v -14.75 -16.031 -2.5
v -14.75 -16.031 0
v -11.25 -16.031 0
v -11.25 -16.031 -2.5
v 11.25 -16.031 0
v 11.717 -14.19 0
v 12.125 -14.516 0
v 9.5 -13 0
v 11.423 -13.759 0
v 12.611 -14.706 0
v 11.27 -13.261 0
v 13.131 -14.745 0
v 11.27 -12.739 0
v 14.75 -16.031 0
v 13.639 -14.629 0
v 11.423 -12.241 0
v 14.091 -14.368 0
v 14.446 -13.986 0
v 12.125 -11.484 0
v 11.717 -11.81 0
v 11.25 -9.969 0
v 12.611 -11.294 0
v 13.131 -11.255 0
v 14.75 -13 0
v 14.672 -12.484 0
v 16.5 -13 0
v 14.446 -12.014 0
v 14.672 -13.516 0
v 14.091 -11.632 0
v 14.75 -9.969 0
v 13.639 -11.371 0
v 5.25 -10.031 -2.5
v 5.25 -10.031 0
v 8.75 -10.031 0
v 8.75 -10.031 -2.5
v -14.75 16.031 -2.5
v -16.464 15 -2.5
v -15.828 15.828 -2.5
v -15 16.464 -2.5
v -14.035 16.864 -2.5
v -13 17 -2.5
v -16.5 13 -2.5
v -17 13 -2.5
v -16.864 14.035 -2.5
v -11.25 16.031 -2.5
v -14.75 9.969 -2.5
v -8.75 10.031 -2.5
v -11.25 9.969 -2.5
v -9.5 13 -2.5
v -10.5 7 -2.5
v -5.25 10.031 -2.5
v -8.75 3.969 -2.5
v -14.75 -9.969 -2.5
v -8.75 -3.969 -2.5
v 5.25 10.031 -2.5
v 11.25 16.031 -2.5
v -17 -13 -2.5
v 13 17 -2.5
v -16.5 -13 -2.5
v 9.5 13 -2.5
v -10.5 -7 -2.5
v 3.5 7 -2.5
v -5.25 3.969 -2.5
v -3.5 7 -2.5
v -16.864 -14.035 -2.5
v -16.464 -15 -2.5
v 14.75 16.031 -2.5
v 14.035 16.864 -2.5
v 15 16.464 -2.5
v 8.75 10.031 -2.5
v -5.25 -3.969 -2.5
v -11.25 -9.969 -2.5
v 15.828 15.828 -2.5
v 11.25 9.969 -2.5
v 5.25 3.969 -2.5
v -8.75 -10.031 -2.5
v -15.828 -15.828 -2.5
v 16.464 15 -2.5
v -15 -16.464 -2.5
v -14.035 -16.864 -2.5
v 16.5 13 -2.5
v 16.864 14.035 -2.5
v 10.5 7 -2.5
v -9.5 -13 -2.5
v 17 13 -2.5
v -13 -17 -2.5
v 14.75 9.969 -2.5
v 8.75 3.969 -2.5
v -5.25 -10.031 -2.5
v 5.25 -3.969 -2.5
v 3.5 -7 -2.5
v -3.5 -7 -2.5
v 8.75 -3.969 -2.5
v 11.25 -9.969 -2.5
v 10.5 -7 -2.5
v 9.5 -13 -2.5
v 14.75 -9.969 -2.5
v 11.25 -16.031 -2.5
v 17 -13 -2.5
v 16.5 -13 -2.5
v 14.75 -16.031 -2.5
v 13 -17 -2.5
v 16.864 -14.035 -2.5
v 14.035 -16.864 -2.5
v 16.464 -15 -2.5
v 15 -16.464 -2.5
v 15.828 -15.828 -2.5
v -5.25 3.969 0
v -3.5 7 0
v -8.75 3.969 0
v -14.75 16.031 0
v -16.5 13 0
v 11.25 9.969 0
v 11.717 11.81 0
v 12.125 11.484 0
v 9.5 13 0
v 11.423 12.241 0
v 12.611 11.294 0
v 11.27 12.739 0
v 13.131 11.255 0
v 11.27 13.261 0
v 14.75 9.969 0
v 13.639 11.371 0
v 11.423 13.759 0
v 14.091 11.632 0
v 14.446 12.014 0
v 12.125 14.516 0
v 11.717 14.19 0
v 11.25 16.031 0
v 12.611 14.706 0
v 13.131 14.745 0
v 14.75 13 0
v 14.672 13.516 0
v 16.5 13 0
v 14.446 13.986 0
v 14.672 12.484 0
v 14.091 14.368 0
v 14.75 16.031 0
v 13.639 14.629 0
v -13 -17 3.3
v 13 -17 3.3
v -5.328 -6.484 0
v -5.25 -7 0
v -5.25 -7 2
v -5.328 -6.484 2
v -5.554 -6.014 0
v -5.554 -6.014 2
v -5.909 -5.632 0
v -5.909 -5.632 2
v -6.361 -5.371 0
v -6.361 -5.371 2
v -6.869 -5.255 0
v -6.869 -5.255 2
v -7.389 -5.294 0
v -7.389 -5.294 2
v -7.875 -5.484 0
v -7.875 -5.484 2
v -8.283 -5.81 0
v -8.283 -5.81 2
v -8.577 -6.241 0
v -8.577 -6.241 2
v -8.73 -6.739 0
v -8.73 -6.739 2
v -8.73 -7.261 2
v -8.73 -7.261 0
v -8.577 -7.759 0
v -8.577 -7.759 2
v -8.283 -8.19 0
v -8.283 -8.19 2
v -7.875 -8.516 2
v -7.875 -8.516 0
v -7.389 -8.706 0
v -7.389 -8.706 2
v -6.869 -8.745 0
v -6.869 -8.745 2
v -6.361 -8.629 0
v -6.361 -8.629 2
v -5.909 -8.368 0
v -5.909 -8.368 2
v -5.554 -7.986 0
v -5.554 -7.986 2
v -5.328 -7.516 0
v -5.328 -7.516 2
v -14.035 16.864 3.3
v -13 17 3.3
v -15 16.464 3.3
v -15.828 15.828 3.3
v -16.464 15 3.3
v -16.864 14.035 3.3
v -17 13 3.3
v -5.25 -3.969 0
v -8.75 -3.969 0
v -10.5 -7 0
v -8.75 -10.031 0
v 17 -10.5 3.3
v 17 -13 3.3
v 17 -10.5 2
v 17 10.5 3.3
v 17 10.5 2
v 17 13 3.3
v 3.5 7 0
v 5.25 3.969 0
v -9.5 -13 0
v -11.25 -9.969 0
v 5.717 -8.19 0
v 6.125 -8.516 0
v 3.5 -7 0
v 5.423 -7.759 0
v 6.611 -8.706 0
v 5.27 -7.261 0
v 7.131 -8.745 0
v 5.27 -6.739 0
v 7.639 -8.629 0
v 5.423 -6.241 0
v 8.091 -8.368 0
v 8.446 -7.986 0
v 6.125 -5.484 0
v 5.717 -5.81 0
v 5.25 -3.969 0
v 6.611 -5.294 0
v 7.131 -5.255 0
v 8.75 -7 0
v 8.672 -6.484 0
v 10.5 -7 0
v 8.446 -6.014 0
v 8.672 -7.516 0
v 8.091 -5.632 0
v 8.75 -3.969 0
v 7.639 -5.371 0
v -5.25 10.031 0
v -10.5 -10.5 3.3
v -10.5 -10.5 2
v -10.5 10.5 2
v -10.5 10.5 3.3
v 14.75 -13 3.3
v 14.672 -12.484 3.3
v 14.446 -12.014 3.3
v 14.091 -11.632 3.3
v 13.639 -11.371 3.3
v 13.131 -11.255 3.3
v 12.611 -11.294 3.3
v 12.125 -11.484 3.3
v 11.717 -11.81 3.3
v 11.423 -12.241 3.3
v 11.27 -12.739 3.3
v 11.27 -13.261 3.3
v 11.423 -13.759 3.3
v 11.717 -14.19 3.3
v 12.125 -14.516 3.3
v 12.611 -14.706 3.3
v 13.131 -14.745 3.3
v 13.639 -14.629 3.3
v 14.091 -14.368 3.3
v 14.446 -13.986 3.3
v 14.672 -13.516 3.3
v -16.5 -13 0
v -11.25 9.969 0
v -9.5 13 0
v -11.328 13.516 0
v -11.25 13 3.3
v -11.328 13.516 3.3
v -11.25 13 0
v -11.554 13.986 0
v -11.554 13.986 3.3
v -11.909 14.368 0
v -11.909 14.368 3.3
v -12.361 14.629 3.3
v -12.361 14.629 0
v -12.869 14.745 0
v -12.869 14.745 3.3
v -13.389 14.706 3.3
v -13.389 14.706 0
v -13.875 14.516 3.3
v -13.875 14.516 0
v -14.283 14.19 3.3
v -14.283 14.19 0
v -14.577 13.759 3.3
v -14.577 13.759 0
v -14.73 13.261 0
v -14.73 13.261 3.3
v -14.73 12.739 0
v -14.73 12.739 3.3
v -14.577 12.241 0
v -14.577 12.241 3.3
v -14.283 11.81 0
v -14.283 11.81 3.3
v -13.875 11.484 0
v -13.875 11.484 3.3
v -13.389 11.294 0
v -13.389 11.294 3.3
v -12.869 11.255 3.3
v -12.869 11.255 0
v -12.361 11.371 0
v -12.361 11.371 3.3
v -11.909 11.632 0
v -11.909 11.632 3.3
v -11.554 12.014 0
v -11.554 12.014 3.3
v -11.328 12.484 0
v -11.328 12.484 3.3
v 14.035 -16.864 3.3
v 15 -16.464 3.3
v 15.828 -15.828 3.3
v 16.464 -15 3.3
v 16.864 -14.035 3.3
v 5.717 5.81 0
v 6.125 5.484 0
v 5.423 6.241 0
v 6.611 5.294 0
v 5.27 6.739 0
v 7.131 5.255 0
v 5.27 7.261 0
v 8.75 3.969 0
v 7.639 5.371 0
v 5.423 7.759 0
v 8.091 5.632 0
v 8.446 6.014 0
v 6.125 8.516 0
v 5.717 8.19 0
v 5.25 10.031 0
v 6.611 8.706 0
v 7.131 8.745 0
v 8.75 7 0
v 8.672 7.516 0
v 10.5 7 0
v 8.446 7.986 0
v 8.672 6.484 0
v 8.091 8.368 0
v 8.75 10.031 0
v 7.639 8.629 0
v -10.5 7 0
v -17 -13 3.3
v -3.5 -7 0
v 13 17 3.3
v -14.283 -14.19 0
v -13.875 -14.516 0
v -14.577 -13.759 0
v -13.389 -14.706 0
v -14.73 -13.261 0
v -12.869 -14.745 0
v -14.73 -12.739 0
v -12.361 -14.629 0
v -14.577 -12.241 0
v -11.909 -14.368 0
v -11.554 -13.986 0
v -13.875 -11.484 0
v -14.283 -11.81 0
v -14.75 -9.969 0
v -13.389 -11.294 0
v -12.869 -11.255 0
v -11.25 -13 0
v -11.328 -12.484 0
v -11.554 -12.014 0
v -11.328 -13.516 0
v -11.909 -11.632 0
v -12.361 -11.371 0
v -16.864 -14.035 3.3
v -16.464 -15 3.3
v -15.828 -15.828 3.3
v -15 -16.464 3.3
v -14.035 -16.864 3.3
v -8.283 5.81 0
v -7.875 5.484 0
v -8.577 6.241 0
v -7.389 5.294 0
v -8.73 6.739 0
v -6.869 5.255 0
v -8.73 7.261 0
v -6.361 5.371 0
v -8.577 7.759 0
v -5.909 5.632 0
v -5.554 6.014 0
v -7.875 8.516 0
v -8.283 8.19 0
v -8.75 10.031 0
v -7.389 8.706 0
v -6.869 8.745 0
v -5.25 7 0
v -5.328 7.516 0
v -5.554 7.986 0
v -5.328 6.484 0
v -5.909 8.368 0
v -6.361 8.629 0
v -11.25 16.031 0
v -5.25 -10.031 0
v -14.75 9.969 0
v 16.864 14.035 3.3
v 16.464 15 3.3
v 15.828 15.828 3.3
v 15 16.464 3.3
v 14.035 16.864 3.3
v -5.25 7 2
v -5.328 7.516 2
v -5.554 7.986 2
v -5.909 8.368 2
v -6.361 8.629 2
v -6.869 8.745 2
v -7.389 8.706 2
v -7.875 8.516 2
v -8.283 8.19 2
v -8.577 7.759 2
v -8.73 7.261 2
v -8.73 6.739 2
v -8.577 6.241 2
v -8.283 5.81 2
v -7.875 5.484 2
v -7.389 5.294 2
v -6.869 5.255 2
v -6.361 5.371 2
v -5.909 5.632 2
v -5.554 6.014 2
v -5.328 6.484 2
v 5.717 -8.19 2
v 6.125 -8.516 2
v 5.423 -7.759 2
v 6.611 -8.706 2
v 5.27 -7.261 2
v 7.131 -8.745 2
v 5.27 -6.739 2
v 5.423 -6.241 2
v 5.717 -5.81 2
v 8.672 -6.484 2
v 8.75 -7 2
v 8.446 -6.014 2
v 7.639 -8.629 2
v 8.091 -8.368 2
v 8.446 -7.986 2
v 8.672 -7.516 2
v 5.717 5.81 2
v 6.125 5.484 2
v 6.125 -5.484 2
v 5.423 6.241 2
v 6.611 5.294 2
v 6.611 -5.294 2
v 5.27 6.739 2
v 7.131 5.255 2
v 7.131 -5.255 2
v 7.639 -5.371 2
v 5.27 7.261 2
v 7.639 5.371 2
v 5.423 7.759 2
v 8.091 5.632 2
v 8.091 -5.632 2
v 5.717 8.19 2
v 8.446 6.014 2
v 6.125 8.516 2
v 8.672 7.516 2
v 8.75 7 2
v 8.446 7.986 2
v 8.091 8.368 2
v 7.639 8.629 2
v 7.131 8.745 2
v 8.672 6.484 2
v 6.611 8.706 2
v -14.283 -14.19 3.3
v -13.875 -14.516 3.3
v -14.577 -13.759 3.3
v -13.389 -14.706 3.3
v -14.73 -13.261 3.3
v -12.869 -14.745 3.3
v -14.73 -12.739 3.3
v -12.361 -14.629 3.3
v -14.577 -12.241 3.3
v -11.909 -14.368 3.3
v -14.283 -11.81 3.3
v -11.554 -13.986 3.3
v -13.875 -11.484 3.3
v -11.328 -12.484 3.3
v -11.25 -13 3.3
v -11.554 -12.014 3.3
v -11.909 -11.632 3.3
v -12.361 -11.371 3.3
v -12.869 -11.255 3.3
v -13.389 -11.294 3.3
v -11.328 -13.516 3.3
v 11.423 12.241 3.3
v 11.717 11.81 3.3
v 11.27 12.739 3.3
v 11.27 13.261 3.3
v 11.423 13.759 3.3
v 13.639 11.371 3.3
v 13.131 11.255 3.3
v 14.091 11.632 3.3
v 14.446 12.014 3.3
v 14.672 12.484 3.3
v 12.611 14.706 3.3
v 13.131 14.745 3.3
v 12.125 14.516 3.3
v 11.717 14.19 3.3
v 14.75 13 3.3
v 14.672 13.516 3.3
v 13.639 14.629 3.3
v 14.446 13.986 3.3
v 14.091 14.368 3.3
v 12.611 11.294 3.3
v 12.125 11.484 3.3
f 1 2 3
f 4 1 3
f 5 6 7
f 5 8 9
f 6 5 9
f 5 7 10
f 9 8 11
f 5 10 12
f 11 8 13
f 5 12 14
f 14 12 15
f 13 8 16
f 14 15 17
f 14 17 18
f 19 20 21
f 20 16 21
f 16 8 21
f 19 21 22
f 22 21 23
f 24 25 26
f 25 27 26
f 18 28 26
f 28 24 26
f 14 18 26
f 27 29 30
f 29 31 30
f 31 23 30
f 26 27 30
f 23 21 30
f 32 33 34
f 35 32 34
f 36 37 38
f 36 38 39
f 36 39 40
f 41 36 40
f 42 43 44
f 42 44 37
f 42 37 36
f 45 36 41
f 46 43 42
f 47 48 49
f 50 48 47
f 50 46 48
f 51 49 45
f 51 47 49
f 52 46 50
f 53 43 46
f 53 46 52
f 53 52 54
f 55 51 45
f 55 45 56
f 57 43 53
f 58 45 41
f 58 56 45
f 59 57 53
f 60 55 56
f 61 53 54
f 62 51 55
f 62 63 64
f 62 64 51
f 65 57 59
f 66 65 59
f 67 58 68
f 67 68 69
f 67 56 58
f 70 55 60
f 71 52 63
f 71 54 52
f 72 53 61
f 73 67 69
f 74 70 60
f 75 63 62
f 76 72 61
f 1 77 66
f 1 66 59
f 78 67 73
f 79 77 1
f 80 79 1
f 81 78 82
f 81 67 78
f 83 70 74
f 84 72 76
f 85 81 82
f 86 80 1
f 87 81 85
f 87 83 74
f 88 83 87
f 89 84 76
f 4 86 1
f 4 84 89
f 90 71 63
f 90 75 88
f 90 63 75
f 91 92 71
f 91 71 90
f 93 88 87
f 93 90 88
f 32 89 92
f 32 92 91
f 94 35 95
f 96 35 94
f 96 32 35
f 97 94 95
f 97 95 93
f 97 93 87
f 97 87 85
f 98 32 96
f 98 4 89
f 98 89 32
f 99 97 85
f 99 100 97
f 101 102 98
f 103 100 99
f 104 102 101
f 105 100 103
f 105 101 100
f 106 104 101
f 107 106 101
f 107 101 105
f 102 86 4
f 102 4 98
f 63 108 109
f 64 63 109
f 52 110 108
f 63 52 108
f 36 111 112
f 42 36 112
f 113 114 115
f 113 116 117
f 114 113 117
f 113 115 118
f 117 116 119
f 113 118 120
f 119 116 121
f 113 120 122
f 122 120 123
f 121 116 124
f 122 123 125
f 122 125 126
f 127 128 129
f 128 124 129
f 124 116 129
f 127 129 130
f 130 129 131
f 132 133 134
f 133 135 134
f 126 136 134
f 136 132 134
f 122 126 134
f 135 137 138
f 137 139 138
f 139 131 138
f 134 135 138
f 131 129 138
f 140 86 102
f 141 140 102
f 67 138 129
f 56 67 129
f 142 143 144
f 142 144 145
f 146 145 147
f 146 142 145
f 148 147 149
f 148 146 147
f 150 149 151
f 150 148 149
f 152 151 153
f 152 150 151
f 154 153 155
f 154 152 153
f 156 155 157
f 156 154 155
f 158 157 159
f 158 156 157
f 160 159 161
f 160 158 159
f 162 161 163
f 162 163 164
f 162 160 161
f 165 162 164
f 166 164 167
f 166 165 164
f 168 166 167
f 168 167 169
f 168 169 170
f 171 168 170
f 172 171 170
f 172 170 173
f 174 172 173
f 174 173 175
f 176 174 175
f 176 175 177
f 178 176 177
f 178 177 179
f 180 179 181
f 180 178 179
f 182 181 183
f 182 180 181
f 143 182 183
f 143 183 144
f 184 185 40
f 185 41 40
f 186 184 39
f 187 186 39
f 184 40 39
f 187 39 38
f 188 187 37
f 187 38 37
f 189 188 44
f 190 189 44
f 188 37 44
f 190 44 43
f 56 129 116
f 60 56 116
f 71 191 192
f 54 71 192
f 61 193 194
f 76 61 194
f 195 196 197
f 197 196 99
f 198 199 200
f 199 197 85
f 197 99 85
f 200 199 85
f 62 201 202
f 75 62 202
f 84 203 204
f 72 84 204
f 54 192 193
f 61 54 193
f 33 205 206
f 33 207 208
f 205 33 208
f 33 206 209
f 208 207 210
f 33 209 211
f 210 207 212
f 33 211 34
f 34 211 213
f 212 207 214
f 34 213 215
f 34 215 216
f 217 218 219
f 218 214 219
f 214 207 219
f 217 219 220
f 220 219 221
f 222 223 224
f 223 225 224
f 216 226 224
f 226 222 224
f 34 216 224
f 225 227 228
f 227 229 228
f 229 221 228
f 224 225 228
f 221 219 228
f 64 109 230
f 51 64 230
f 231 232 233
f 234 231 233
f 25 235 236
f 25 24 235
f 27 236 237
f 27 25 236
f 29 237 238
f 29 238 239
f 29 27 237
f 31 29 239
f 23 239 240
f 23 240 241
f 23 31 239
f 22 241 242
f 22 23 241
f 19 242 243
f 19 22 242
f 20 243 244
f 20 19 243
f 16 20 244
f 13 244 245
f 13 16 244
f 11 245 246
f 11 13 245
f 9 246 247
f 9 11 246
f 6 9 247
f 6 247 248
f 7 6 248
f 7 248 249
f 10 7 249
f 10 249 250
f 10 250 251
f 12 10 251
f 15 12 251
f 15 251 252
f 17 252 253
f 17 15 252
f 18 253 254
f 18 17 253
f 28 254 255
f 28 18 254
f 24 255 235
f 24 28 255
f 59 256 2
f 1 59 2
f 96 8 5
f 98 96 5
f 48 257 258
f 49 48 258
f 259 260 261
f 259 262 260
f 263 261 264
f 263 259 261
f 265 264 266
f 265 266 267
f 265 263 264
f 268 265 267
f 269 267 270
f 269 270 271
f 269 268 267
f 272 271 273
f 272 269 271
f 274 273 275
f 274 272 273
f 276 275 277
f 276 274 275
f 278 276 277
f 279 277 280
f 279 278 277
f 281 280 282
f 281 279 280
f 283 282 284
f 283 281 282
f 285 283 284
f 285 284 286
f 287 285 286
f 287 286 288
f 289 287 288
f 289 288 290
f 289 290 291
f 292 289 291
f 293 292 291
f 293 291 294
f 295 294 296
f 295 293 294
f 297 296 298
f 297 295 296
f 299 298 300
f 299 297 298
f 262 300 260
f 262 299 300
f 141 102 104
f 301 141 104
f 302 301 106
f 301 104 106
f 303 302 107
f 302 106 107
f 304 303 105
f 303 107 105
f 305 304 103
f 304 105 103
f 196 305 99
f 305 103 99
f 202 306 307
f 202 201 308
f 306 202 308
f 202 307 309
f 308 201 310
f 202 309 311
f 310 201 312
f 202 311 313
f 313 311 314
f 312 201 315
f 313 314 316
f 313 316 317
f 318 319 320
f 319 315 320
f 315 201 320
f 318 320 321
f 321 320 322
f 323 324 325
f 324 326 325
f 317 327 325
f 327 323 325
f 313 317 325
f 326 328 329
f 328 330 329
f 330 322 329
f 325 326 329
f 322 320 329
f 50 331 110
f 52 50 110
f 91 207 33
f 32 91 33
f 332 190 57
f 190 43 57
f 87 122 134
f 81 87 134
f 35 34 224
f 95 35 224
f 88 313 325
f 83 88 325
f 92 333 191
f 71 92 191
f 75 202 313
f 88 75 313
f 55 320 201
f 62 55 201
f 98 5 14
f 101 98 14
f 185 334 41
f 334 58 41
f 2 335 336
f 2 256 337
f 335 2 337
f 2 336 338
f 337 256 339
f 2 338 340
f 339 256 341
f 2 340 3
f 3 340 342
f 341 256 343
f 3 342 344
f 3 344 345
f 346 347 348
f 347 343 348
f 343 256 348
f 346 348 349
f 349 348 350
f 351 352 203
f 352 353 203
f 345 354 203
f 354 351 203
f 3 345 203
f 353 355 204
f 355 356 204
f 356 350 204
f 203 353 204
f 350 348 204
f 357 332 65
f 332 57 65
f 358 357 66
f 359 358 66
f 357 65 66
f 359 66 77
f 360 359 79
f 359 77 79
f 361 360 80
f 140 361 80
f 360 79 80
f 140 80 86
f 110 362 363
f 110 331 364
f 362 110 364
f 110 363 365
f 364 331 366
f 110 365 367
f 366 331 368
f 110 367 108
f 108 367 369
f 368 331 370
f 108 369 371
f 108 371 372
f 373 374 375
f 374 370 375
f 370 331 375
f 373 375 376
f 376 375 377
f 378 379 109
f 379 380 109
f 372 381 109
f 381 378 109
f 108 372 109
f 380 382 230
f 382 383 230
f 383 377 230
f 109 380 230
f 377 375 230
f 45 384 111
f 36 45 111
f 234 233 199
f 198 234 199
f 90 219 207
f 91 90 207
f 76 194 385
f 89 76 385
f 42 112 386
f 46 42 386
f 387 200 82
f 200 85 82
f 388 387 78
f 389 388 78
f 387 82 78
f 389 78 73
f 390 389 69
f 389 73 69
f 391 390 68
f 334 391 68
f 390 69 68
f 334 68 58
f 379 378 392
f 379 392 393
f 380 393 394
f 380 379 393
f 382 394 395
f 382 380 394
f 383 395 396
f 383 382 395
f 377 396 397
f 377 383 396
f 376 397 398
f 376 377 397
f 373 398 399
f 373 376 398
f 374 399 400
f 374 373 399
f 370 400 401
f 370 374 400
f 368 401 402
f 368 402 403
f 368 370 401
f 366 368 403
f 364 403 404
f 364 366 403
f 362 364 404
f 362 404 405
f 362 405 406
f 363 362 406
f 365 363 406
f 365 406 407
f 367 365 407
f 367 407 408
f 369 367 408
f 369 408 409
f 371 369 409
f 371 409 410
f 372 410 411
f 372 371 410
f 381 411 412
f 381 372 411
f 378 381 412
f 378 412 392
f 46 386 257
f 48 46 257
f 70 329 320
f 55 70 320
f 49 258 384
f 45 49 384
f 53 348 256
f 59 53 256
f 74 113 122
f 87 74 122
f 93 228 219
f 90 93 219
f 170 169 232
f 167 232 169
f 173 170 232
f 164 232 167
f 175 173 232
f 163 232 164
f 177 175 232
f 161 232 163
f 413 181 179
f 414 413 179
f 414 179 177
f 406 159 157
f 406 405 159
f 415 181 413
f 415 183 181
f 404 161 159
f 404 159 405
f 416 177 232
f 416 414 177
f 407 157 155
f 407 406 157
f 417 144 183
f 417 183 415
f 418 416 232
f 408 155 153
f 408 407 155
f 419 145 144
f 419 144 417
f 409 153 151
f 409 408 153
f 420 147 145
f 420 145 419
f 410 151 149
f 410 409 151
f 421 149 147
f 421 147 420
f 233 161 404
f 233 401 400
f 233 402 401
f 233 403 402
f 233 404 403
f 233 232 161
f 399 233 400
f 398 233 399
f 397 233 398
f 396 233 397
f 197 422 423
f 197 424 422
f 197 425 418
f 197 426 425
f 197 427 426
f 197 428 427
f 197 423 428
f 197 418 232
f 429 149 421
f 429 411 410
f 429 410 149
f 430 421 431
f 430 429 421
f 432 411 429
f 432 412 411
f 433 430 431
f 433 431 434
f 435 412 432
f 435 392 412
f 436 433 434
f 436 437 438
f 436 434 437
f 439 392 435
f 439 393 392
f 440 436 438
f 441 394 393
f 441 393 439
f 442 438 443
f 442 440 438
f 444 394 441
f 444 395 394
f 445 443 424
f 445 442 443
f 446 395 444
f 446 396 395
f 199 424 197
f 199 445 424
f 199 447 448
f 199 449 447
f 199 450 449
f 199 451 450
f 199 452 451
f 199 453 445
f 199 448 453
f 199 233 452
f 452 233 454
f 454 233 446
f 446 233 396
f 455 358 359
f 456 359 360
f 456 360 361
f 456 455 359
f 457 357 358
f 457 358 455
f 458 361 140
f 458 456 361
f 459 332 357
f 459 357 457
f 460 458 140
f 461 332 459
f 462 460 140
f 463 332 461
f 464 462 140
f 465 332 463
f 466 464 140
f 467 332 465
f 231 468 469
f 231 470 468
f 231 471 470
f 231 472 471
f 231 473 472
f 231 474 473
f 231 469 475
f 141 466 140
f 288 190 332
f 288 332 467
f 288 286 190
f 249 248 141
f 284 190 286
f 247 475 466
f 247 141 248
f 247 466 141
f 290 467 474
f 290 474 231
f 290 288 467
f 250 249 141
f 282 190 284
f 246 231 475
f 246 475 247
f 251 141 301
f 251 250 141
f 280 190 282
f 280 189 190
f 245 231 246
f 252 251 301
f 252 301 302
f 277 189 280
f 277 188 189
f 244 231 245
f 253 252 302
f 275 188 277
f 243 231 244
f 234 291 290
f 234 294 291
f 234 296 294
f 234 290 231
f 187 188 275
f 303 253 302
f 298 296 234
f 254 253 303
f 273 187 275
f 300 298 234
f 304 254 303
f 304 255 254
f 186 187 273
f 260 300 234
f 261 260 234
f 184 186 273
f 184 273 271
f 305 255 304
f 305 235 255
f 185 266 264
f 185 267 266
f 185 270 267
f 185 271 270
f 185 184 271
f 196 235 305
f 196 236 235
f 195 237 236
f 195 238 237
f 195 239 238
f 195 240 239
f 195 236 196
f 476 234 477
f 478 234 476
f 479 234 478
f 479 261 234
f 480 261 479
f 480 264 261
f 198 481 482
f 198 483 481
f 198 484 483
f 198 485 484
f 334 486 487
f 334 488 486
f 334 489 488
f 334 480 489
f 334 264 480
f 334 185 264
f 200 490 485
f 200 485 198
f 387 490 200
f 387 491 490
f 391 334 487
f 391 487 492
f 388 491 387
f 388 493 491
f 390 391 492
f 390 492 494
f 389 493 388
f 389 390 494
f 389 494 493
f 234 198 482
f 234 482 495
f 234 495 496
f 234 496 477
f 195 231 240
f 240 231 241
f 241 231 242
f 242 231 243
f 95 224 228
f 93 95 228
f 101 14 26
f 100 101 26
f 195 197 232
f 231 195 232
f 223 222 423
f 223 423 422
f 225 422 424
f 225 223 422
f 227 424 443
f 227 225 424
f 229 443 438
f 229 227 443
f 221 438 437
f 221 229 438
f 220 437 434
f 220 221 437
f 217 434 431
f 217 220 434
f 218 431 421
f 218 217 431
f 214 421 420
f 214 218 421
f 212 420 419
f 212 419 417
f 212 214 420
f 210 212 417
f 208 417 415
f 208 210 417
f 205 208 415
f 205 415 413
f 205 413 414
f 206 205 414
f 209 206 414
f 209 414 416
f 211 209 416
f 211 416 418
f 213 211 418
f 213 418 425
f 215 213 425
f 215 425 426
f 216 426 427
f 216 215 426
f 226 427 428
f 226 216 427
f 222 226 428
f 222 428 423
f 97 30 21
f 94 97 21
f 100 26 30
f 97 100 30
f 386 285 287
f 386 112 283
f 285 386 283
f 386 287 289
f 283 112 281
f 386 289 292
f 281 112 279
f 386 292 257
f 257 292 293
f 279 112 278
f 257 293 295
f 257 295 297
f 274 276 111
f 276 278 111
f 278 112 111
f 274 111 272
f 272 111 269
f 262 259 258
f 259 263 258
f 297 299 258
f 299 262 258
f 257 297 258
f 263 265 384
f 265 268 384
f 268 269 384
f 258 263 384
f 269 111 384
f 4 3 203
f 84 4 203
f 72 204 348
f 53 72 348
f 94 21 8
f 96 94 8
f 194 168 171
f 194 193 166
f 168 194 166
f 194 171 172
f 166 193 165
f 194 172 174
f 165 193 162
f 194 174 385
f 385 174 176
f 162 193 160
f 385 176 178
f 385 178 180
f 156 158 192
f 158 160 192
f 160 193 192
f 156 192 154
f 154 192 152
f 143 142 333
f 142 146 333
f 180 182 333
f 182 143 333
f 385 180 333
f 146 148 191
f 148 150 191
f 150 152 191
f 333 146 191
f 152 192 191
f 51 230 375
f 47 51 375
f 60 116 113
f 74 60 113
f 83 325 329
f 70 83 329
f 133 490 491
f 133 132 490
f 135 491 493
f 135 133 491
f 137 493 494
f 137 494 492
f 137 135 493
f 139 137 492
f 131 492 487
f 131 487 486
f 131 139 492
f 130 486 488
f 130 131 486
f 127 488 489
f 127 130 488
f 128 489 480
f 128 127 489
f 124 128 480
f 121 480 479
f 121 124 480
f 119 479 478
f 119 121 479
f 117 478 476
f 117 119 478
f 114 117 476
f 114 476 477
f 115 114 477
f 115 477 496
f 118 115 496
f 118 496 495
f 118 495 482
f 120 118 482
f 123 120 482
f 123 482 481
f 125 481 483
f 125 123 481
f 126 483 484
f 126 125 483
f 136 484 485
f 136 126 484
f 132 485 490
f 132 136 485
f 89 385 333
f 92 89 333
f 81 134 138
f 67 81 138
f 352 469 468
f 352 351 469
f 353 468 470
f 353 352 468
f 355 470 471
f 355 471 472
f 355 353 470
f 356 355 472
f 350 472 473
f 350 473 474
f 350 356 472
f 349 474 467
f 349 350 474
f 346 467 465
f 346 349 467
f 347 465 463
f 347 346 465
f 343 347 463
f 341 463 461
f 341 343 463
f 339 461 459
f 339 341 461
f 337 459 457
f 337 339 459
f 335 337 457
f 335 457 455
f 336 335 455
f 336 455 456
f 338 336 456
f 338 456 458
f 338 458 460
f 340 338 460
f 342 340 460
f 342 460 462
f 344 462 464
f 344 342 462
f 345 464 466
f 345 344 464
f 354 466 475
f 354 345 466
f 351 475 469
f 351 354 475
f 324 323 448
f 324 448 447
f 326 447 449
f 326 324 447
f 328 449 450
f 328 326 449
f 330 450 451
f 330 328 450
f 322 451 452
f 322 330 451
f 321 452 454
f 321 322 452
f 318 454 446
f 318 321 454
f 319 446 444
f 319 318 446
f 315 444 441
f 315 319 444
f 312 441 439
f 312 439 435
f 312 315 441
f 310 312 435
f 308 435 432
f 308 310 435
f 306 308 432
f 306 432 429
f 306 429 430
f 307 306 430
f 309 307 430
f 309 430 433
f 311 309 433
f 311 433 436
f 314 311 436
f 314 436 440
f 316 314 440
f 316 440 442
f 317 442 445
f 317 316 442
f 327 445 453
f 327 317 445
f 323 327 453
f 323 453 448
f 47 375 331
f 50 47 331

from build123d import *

# Parameters (mm, degrees)
F0_R     = 1.75
F1_DEPTH = 2
F3_DEPTH = 2.5
F4_R     = 1.75
F5_DEPTH = 1.3


with BuildPart() as f1:
    # F0 (on Top) → F1 (new body)
    with BuildSketch(Plane.XY):
        with BuildLine():
            ThreePointArc((-13, -17), (-10.171573, -15.828427), (-9, -13))
            ThreePointArc((-9, -13), (-13, -9), (-17, -13))
            ThreePointArc((-17, -13), (-15.828427, -15.828427), (-13, -17))
        make_face()
        with Locations((-13, -13)):
            Circle(F0_R, mode=Mode.SUBTRACT)
        with BuildLine():
            ThreePointArc((-17, -13), (-13, -9), (-9, -13))
            ThreePointArc((-9, -13), (-10.171573, -15.828427), (-13, -17))
            Line((-13, -17), (13, -17))
            ThreePointArc((13, -17), (10.171573, -10.171573), (17, -13))
            Line((17, -13), (17, 13))
            ThreePointArc((17, 13), (10.171573, 10.171573), (13, 17))
            Line((13, 17), (-13, 17))
            ThreePointArc((-13, 17), (-10.171573, 15.828427), (-9, 13))
            ThreePointArc((-9, 13), (-13, 9), (-17, 13))
            Line((-17, 13), (-17, -13))
        make_face()
        with Locations((-7, -7)):
            Circle(F0_R, mode=Mode.SUBTRACT)
        with Locations((7, -7)):
            Circle(F0_R, mode=Mode.SUBTRACT)
        with Locations((-7, 7)):
            Circle(F0_R, mode=Mode.SUBTRACT)
        with Locations((7, 7)):
            Circle(F0_R, mode=Mode.SUBTRACT)
        with BuildLine():
            ThreePointArc((-13, 17), (-15.828427, 15.828427), (-17, 13))
            ThreePointArc((-17, 13), (-13, 9), (-9, 13))
            ThreePointArc((-9, 13), (-10.171573, 15.828427), (-13, 17))
        make_face()
        with Locations((-13, 13)):
            Circle(F0_R, mode=Mode.SUBTRACT)
        with BuildLine():
            ThreePointArc((17, -13), (10.171573, -10.171573), (13, -17))
            ThreePointArc((13, -17), (15.828427, -15.828427), (17, -13))
        make_face()
        with Locations((13, -13)):
            Circle(F0_R, mode=Mode.SUBTRACT)
        with BuildLine():
            ThreePointArc((17, 13), (15.828427, 15.828427), (13, 17))
            ThreePointArc((13, 17), (10.171573, 10.171573), (17, 13))
        make_face()
        with Locations((13, 13)):
            Circle(F0_R, mode=Mode.SUBTRACT)
    extrude(amount=F1_DEPTH)

    # F2 (on face) → F3 (join)
    with BuildSketch(Plane(origin=(0, 0, 0), x_dir=(1, 0, 0), z_dir=(0, 0, -1))):
        with BuildLine():
            ThreePointArc((-13, 17), (-15.828427, 15.828427), (-17, 13))
            Line((-17, 13), (-17, -13))
            ThreePointArc((-17, -13), (-15.828427, -15.828427), (-13, -17))
            Line((-13, -17), (13, -17))
            ThreePointArc((13, -17), (15.828427, -15.828427), (17, -13))
            Line((17, -13), (17, 13))
            ThreePointArc((17, 13), (15.828427, 15.828427), (13, 17))
            Line((13, 17), (-13, 17))
        make_face()
        Polygon((-11.25, -9.968911), (-9.5, -13), (-11.25, -16.031089), (-14.75, -16.031089), (-16.5, -13), (-14.75, -9.968911), align=None, mode=Mode.SUBTRACT)
        Polygon((-5.25, -3.968911), (-3.5, -7), (-5.25, -10.031089), (-8.75, -10.031089), (-10.5, -7), (-8.75, -3.968911), align=None, mode=Mode.SUBTRACT)
        Polygon((14.75, -9.968911), (16.5, -13), (14.75, -16.031089), (11.25, -16.031089), (9.5, -13), (11.25, -9.968911), align=None, mode=Mode.SUBTRACT)
        Polygon((8.75, -3.968911), (10.5, -7), (8.75, -10.031089), (5.25, -10.031089), (3.5, -7), (5.25, -3.968911), align=None, mode=Mode.SUBTRACT)
        Polygon((-8.75, 10.031089), (-5.25, 10.031089), (-3.5, 7), (-5.25, 3.968911), (-8.75, 3.968911), (-10.5, 7), align=None, mode=Mode.SUBTRACT)
        Polygon((-11.25, 16.031089), (-9.5, 13), (-11.25, 9.968911), (-14.75, 9.968911), (-16.5, 13), (-14.75, 16.031089), align=None, mode=Mode.SUBTRACT)
        Polygon((8.75, 10.031089), (10.5, 7), (8.75, 3.968911), (5.25, 3.968911), (3.5, 7), (5.25, 10.031089), align=None, mode=Mode.SUBTRACT)
        Polygon((11.25, 16.031089), (14.75, 16.031089), (16.5, 13), (14.75, 9.968911), (11.25, 9.968911), (9.5, 13), align=None, mode=Mode.SUBTRACT)
    extrude(amount=F3_DEPTH)

    # F4 (on face) → F5 (join)
    with BuildSketch(Plane.XY.offset(2)):
        with BuildLine():
            Line((-10.5, 10.5), (10.5, 10.5))
            Line((10.5, 10.5), (17, 10.5))
            Line((17, 10.5), (17, 13))
            ThreePointArc((17, 13), (15.828427, 15.828427), (13, 17))
            Line((13, 17), (-13, 17))
            ThreePointArc((-13, 17), (-15.828427, 15.828427), (-17, 13))
            Line((-17, 13), (-17, -13))
            ThreePointArc((-17, -13), (-15.828427, -15.828427), (-13, -17))
            Line((-13, -17), (13, -17))
            ThreePointArc((13, -17), (15.828427, -15.828427), (17, -13))
            Line((17, -13), (17, -10.5))
            Line((17, -10.5), (10.5, -10.5))
            Line((10.5, -10.5), (-10.5, -10.5))
            Line((-10.5, -10.5), (-10.5, 10.5))
        make_face()
        with Locations((-13, -13)):
            Circle(F4_R, mode=Mode.SUBTRACT)
        with Locations((13, -13)):
            Circle(F4_R, mode=Mode.SUBTRACT)
        with Locations((-13, 13)):
            Circle(F4_R, mode=Mode.SUBTRACT)
        with Locations((13, 13)):
            Circle(F4_R, mode=Mode.SUBTRACT)
    extrude(amount=F5_DEPTH)


solid = f1.part
